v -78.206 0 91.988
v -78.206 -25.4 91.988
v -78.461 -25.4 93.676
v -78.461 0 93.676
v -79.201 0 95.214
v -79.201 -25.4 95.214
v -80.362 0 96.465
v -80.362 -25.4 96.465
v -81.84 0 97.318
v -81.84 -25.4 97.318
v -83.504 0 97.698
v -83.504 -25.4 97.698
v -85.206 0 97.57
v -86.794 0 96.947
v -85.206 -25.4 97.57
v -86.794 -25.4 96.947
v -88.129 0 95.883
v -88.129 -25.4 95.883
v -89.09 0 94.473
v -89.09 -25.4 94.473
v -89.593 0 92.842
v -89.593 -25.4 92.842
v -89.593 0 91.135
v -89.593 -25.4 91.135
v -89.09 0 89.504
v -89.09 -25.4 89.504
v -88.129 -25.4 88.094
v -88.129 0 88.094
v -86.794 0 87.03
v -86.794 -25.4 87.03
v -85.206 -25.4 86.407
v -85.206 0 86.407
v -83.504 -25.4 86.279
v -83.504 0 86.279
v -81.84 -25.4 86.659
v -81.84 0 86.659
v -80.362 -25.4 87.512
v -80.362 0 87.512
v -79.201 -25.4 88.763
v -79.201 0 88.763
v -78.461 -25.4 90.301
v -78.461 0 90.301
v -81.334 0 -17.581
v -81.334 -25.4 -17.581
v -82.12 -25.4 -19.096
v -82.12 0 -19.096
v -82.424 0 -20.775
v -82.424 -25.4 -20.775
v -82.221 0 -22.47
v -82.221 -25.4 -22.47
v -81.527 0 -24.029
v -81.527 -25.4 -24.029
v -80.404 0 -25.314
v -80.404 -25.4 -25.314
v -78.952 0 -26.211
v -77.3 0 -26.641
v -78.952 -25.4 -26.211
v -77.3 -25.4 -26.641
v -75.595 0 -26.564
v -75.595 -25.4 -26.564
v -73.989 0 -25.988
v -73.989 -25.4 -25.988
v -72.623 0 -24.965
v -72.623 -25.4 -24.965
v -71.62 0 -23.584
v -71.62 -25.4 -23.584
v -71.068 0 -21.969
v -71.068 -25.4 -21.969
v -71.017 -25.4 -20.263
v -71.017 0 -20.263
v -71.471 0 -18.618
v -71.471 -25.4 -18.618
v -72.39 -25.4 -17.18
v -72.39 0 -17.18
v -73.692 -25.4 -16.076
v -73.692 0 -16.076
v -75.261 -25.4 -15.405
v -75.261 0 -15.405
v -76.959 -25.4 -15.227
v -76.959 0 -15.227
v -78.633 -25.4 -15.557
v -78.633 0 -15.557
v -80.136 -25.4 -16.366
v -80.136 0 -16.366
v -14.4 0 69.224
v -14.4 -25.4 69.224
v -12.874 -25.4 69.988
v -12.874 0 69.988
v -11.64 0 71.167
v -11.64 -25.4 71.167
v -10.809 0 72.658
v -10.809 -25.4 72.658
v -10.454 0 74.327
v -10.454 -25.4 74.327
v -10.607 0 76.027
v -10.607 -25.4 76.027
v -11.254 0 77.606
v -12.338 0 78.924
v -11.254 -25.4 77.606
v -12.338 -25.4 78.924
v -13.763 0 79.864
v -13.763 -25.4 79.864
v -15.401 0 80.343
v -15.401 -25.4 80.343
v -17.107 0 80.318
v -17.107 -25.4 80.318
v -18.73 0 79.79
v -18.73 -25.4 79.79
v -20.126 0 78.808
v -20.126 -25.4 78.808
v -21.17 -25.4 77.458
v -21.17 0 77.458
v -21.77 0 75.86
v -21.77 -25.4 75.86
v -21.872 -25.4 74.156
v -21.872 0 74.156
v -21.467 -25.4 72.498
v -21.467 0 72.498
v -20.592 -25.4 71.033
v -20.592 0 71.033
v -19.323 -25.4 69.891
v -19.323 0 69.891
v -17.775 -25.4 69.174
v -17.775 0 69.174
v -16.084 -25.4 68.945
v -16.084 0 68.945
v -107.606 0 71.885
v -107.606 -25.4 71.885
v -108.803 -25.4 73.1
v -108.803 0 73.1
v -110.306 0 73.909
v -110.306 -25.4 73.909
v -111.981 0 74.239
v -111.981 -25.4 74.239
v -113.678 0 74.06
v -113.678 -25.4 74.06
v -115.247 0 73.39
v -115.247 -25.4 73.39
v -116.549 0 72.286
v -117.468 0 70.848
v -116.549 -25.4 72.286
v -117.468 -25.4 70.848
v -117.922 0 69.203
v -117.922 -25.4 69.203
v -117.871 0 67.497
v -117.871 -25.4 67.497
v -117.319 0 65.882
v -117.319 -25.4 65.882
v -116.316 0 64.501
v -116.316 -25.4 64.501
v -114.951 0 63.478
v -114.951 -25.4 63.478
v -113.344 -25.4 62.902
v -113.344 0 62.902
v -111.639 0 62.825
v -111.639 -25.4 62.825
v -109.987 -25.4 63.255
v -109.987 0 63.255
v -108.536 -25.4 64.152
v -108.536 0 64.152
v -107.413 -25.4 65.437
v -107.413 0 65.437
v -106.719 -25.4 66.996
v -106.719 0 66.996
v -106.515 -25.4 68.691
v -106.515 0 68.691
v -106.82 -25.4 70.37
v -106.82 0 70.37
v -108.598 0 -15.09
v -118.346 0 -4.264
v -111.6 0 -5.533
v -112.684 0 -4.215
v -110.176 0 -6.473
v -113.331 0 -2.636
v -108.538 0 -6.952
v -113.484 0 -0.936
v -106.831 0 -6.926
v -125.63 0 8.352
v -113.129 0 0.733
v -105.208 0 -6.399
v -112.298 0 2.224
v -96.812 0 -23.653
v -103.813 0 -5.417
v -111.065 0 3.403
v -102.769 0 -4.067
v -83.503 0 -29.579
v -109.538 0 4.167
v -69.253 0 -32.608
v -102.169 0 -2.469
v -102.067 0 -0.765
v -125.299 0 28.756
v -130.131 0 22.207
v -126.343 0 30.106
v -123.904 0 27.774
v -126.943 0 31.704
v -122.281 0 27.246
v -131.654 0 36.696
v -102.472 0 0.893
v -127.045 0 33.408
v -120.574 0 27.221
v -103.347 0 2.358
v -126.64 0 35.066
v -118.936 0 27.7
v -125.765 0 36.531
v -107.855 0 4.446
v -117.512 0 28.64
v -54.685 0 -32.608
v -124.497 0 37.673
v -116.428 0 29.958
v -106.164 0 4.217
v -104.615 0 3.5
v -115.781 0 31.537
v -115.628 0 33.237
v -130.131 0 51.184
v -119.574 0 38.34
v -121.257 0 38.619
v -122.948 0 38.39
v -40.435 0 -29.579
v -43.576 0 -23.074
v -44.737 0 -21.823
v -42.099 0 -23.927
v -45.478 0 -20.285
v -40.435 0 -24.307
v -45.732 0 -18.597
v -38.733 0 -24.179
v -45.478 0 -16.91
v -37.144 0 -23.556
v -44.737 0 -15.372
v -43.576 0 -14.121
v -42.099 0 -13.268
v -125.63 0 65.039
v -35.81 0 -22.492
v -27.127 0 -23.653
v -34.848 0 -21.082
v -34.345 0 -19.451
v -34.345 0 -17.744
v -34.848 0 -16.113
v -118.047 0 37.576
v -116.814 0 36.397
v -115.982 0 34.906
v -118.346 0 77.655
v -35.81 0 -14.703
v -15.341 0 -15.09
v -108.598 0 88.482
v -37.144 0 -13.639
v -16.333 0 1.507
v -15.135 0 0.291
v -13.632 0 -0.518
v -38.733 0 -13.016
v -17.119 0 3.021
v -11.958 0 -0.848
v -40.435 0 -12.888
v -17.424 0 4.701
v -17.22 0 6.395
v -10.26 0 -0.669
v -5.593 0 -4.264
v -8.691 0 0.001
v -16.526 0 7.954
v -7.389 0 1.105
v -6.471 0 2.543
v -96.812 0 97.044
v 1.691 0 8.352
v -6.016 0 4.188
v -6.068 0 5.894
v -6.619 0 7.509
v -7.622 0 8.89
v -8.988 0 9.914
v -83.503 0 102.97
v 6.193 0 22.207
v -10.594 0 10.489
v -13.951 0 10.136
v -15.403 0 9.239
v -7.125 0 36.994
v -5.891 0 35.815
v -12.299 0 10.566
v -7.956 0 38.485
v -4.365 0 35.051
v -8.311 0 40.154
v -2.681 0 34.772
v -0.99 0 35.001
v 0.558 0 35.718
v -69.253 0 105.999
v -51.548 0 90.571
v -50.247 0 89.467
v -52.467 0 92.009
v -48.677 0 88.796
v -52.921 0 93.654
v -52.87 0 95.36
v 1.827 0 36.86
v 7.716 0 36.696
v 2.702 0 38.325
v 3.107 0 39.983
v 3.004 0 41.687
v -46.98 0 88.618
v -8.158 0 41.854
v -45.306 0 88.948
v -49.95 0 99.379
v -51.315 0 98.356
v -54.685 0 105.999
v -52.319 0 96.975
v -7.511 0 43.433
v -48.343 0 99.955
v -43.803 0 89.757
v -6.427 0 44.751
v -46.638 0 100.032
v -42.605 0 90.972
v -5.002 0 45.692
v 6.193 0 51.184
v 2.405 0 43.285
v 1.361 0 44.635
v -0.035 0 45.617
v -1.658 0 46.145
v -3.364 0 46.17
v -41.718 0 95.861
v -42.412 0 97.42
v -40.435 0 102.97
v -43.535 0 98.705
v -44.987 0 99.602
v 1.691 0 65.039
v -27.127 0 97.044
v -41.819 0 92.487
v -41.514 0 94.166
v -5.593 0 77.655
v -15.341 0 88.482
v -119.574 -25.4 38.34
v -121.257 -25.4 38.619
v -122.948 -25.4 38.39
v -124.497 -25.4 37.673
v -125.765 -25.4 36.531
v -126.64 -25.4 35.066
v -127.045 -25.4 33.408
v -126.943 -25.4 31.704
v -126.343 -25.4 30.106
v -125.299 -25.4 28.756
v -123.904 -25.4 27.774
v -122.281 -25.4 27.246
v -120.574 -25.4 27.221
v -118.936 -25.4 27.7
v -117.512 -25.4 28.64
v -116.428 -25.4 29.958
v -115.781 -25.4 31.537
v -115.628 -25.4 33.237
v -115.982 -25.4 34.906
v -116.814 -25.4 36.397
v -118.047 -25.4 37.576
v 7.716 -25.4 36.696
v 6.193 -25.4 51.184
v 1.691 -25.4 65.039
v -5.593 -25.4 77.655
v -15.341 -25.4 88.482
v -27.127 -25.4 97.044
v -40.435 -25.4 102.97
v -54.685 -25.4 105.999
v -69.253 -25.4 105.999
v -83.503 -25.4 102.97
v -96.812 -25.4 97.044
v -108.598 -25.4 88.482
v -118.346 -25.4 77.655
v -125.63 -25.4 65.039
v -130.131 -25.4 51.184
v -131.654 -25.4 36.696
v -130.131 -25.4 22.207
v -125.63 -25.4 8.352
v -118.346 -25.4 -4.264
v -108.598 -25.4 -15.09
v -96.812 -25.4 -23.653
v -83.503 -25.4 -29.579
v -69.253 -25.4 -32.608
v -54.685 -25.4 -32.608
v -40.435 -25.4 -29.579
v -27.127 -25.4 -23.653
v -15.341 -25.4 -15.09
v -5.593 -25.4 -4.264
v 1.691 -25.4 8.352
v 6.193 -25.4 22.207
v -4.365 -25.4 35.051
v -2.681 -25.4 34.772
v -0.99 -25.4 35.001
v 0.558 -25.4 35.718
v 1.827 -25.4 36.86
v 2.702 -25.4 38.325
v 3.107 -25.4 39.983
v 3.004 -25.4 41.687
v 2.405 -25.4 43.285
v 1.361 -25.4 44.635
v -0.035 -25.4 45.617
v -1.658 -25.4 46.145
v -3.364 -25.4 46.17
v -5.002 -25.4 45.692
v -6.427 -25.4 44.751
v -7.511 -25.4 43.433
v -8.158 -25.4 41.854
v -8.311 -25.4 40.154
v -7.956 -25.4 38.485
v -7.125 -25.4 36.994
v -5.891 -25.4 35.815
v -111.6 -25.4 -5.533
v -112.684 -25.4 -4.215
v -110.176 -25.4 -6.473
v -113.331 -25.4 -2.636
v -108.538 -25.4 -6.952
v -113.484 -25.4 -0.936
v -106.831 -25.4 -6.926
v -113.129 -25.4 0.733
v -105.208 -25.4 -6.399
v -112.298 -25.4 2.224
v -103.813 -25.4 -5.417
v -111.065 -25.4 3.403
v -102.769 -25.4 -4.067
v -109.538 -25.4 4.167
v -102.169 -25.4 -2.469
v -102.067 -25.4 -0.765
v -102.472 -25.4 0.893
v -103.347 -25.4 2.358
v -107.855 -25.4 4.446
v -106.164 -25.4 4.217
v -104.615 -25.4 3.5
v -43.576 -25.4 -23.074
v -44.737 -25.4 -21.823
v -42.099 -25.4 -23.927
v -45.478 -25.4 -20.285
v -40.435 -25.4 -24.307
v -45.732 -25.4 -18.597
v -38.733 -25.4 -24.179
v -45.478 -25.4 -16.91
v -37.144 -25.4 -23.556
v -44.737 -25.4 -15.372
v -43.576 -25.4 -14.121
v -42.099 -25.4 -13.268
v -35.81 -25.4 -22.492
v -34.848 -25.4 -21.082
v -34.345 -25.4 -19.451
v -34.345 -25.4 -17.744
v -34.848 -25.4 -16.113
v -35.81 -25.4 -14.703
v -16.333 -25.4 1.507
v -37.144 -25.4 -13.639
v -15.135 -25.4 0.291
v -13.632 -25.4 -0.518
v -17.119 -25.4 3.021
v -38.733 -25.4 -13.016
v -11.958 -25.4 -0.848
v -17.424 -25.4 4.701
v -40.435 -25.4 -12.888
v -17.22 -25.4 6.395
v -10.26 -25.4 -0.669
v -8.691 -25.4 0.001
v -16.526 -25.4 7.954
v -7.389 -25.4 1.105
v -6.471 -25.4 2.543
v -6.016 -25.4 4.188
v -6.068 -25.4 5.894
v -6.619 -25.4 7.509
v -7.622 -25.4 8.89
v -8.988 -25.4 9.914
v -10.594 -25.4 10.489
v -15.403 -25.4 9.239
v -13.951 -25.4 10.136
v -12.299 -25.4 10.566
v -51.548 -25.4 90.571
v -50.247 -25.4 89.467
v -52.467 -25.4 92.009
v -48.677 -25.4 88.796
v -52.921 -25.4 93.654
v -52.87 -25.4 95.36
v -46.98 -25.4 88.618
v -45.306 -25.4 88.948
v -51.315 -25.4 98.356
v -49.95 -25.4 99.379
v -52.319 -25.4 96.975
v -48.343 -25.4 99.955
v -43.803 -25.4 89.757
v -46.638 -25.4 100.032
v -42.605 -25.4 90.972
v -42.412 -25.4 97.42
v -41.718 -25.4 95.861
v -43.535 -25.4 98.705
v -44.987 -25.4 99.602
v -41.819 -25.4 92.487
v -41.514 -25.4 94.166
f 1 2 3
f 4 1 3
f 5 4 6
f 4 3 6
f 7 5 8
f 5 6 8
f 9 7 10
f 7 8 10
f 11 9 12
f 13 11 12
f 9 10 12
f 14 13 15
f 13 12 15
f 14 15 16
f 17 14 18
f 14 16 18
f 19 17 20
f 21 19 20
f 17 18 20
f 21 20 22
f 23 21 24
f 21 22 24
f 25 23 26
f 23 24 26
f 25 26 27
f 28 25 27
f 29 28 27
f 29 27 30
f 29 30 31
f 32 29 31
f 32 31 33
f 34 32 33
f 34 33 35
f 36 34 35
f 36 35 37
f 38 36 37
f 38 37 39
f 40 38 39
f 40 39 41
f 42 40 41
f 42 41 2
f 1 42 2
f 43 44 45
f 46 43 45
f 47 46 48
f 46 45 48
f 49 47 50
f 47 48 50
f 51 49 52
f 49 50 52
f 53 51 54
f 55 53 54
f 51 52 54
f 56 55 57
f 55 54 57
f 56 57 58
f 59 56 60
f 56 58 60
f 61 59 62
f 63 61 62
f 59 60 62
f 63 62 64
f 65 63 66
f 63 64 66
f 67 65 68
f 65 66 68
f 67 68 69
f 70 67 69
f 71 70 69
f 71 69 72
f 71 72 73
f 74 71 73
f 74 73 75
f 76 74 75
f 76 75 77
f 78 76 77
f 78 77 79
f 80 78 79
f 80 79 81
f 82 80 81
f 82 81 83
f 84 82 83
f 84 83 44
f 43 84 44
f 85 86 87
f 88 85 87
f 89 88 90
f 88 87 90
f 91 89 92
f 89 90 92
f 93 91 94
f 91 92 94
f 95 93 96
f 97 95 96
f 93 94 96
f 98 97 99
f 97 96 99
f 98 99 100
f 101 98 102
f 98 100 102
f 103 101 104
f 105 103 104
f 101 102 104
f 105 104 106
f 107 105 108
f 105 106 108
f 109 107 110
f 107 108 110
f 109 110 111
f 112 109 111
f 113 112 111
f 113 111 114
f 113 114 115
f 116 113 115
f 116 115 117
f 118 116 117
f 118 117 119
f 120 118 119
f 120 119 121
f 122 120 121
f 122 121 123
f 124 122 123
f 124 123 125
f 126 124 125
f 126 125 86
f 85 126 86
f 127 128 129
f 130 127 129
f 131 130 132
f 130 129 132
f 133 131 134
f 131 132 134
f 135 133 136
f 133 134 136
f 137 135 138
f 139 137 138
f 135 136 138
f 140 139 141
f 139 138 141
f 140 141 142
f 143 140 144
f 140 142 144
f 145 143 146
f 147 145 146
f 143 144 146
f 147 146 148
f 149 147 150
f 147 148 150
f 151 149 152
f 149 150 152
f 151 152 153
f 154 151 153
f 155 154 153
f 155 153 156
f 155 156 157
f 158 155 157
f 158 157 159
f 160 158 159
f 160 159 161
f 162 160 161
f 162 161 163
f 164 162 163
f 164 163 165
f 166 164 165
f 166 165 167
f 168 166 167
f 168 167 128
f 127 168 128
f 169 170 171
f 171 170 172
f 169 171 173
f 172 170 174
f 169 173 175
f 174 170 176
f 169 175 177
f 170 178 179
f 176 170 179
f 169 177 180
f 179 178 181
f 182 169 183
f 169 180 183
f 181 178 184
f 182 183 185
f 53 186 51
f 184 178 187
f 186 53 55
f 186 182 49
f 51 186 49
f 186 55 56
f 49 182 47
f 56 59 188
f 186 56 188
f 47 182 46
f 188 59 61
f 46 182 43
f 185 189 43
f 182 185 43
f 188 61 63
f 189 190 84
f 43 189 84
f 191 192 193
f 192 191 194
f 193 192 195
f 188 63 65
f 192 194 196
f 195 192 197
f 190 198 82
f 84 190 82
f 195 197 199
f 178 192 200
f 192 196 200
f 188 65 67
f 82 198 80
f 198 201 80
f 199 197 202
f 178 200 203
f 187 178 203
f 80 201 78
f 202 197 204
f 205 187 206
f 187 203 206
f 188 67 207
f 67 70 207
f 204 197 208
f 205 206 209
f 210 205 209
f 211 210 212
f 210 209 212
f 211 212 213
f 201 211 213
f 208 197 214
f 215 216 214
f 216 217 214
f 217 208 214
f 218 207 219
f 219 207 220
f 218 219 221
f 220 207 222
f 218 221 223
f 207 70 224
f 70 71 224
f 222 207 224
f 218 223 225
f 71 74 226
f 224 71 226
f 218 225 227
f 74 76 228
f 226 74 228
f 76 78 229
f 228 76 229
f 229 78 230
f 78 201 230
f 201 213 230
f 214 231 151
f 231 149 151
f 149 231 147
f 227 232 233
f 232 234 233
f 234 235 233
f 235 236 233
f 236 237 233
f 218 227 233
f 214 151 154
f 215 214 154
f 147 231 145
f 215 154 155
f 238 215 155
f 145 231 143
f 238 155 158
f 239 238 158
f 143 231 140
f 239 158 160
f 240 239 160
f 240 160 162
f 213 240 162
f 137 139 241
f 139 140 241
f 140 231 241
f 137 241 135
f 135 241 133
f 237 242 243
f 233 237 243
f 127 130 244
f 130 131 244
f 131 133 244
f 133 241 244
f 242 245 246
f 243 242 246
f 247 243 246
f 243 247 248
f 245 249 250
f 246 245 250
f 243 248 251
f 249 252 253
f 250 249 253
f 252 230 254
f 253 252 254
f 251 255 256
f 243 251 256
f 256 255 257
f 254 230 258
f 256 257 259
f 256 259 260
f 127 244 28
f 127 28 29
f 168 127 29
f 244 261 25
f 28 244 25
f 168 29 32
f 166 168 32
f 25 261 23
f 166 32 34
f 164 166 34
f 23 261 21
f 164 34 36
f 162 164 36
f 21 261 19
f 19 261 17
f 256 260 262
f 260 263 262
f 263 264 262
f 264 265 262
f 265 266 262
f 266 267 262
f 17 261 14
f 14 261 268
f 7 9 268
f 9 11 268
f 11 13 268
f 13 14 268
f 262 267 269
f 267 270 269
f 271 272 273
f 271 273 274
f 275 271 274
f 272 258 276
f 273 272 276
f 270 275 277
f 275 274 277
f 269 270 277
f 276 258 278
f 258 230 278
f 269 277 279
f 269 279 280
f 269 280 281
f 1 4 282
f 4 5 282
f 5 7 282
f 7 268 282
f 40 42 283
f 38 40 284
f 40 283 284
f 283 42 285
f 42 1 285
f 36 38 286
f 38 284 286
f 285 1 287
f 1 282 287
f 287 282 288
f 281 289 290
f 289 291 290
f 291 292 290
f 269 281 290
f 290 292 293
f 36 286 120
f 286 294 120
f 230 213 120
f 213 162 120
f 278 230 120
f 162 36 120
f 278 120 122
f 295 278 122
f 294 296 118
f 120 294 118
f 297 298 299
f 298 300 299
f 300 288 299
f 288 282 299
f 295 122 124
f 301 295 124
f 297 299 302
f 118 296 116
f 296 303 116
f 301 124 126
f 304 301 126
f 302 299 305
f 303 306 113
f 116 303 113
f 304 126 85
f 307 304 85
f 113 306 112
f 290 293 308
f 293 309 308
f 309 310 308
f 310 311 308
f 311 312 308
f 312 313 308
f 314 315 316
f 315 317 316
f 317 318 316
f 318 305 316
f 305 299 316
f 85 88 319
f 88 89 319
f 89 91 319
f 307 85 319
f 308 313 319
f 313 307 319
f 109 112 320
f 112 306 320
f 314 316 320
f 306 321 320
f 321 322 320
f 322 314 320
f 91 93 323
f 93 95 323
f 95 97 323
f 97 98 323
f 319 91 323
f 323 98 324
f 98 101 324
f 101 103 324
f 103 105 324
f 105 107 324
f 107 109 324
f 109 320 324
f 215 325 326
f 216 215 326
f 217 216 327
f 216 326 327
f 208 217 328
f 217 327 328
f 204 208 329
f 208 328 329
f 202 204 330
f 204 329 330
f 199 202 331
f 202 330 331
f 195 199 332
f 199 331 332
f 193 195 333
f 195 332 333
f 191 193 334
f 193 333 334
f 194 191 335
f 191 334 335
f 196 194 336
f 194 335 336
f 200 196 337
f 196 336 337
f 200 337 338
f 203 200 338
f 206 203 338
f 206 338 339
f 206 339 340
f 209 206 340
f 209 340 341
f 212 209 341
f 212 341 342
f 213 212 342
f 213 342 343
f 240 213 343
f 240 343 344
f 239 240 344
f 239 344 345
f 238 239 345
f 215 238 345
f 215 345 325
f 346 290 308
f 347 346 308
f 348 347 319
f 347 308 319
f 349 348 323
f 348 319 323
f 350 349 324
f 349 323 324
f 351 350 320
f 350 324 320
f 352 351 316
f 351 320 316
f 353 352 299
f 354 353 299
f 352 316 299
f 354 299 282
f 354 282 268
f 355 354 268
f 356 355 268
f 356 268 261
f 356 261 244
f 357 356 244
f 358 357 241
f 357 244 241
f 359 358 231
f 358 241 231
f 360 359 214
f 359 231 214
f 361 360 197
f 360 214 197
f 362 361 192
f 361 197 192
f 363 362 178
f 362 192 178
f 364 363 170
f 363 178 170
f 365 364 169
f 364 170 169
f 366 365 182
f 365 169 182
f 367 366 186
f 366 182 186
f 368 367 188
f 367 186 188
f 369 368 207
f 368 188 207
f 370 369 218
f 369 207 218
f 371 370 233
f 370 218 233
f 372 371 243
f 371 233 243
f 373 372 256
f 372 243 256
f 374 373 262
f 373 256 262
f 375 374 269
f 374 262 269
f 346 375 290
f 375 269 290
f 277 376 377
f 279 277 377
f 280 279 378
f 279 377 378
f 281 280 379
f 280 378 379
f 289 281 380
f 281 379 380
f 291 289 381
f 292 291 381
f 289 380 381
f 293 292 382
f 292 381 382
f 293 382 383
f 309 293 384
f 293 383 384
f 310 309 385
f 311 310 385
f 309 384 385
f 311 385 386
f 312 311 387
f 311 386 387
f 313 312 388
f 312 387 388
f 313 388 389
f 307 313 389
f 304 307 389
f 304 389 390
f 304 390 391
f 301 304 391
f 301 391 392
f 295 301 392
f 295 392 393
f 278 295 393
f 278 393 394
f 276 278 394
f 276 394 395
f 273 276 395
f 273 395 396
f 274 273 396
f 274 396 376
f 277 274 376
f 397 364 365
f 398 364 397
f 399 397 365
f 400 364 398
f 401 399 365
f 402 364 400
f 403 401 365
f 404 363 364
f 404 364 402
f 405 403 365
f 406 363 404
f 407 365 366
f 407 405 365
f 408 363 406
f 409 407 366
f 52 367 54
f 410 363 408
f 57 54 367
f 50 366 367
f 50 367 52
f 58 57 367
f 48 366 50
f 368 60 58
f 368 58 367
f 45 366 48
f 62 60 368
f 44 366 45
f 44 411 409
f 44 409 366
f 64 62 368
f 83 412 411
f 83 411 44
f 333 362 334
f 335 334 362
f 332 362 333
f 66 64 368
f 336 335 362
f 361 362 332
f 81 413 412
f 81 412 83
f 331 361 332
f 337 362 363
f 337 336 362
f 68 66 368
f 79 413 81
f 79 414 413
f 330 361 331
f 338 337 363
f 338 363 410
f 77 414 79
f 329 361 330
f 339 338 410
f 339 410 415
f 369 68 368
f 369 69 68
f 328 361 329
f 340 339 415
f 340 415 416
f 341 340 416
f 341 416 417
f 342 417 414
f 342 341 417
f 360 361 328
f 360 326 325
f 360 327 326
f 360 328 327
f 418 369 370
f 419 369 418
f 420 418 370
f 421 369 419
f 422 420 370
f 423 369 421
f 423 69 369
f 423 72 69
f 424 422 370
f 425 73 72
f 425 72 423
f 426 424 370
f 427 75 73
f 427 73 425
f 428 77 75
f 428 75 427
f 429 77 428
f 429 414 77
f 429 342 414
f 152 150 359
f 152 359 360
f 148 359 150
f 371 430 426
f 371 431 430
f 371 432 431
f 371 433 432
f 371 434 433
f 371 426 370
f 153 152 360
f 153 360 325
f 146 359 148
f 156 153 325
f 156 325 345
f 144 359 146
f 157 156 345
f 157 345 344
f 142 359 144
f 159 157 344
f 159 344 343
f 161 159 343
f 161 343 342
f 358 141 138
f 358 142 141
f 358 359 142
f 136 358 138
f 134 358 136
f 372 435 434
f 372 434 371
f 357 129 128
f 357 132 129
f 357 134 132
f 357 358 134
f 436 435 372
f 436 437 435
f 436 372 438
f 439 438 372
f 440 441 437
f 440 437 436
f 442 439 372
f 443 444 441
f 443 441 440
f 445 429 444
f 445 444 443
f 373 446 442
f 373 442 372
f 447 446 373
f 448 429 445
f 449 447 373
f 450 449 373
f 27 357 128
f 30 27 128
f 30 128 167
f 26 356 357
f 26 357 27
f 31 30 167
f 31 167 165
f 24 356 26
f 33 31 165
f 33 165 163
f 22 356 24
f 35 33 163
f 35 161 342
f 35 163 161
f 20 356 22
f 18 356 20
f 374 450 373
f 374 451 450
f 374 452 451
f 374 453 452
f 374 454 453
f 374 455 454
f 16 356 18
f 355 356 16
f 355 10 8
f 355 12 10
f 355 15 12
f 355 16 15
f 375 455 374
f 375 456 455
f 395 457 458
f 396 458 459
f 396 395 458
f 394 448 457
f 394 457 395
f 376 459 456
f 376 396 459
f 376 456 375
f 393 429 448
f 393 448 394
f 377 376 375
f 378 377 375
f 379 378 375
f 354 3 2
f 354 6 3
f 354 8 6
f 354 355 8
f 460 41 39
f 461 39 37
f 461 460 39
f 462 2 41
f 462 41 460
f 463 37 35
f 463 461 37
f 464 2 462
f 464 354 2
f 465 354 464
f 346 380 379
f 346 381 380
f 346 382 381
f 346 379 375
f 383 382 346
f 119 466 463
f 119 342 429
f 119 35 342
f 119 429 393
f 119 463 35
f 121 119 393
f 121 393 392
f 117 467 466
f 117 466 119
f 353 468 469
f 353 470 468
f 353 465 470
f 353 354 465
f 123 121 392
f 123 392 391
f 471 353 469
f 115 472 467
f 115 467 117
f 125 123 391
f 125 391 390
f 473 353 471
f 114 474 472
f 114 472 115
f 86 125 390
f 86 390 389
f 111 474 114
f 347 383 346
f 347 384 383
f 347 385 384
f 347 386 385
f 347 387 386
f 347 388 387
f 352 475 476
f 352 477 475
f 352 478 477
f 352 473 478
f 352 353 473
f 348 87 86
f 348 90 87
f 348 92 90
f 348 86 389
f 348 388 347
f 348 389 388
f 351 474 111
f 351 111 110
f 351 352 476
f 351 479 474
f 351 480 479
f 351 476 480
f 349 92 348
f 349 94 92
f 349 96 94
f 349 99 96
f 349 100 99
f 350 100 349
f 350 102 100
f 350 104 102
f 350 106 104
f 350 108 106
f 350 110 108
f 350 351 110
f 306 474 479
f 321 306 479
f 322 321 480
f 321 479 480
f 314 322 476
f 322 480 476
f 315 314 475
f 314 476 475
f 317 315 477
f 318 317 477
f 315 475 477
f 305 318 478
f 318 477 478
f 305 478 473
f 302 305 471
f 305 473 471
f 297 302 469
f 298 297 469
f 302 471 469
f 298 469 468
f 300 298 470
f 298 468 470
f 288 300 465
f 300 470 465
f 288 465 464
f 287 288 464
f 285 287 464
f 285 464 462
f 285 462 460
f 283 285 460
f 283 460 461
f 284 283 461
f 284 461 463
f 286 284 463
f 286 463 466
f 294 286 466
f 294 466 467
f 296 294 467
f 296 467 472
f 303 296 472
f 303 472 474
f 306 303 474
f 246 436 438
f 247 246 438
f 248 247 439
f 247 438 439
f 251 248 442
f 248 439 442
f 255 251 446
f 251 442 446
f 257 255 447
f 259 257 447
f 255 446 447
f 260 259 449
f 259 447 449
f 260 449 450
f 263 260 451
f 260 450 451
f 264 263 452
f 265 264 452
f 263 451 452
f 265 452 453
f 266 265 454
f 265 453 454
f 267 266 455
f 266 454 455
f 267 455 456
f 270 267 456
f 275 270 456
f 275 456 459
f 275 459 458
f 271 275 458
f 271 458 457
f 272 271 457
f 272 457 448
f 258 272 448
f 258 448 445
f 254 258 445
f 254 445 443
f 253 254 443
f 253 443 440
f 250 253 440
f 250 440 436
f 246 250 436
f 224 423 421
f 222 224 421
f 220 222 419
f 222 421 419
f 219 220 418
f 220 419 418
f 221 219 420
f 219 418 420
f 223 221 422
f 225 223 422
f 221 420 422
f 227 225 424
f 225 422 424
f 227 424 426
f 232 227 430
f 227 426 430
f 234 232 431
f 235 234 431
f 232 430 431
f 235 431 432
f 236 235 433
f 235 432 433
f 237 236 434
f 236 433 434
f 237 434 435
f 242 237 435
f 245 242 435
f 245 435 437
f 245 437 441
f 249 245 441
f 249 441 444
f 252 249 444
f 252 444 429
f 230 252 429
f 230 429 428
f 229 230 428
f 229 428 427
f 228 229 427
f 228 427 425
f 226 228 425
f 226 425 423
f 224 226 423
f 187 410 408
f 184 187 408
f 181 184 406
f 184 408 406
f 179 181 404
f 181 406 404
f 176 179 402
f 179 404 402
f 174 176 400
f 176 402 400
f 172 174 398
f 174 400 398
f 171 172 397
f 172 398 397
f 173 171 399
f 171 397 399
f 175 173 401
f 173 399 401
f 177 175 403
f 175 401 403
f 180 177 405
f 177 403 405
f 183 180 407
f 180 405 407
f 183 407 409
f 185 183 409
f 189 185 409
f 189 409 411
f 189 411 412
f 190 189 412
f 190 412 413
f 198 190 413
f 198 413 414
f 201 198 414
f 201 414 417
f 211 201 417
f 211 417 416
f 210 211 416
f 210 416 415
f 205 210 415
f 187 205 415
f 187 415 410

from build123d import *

# Parameters (mm, degrees)
F0_R            = 69.6849
F1_DEPTH        = 25.4
F2_R            = 5.7253497259
F3_DEPTH        = 25.401
F3_COPIES_COUNT = 10


# Not quite as in the source:
# - a pattern or mirror of a feature is missing from the dataset's text; its kind, count and spacing are read off the source's solid


with BuildPart() as f1:
    # F0 (on Front) → F1 (new body)
    with BuildSketch(Plane.XZ):
        with Locations((-61.9692653418, 36.6955287755)):
            Circle(F0_R)
    extrude(amount=F1_DEPTH)

    # F2 (on face) → F3 (cut, through all)
    with BuildSketch(Plane.XZ.offset(25.4)):
        with Locations((-83.9317291975, 91.9884815812)):
            Circle(F2_R)
    f3 = extrude(amount=-F3_DEPTH, mode=Mode.SUBTRACT)

    # F3_copies: F3 ×10 about axis
    f3_copies_axis = Axis((-61.969265, 0, 36.695529), (0, 1, 0))
    for i in range(1, F3_COPIES_COUNT):
        add(f3.rotate(f3_copies_axis, i * 360 / F3_COPIES_COUNT), mode=Mode.SUBTRACT)


solid = f1.part
